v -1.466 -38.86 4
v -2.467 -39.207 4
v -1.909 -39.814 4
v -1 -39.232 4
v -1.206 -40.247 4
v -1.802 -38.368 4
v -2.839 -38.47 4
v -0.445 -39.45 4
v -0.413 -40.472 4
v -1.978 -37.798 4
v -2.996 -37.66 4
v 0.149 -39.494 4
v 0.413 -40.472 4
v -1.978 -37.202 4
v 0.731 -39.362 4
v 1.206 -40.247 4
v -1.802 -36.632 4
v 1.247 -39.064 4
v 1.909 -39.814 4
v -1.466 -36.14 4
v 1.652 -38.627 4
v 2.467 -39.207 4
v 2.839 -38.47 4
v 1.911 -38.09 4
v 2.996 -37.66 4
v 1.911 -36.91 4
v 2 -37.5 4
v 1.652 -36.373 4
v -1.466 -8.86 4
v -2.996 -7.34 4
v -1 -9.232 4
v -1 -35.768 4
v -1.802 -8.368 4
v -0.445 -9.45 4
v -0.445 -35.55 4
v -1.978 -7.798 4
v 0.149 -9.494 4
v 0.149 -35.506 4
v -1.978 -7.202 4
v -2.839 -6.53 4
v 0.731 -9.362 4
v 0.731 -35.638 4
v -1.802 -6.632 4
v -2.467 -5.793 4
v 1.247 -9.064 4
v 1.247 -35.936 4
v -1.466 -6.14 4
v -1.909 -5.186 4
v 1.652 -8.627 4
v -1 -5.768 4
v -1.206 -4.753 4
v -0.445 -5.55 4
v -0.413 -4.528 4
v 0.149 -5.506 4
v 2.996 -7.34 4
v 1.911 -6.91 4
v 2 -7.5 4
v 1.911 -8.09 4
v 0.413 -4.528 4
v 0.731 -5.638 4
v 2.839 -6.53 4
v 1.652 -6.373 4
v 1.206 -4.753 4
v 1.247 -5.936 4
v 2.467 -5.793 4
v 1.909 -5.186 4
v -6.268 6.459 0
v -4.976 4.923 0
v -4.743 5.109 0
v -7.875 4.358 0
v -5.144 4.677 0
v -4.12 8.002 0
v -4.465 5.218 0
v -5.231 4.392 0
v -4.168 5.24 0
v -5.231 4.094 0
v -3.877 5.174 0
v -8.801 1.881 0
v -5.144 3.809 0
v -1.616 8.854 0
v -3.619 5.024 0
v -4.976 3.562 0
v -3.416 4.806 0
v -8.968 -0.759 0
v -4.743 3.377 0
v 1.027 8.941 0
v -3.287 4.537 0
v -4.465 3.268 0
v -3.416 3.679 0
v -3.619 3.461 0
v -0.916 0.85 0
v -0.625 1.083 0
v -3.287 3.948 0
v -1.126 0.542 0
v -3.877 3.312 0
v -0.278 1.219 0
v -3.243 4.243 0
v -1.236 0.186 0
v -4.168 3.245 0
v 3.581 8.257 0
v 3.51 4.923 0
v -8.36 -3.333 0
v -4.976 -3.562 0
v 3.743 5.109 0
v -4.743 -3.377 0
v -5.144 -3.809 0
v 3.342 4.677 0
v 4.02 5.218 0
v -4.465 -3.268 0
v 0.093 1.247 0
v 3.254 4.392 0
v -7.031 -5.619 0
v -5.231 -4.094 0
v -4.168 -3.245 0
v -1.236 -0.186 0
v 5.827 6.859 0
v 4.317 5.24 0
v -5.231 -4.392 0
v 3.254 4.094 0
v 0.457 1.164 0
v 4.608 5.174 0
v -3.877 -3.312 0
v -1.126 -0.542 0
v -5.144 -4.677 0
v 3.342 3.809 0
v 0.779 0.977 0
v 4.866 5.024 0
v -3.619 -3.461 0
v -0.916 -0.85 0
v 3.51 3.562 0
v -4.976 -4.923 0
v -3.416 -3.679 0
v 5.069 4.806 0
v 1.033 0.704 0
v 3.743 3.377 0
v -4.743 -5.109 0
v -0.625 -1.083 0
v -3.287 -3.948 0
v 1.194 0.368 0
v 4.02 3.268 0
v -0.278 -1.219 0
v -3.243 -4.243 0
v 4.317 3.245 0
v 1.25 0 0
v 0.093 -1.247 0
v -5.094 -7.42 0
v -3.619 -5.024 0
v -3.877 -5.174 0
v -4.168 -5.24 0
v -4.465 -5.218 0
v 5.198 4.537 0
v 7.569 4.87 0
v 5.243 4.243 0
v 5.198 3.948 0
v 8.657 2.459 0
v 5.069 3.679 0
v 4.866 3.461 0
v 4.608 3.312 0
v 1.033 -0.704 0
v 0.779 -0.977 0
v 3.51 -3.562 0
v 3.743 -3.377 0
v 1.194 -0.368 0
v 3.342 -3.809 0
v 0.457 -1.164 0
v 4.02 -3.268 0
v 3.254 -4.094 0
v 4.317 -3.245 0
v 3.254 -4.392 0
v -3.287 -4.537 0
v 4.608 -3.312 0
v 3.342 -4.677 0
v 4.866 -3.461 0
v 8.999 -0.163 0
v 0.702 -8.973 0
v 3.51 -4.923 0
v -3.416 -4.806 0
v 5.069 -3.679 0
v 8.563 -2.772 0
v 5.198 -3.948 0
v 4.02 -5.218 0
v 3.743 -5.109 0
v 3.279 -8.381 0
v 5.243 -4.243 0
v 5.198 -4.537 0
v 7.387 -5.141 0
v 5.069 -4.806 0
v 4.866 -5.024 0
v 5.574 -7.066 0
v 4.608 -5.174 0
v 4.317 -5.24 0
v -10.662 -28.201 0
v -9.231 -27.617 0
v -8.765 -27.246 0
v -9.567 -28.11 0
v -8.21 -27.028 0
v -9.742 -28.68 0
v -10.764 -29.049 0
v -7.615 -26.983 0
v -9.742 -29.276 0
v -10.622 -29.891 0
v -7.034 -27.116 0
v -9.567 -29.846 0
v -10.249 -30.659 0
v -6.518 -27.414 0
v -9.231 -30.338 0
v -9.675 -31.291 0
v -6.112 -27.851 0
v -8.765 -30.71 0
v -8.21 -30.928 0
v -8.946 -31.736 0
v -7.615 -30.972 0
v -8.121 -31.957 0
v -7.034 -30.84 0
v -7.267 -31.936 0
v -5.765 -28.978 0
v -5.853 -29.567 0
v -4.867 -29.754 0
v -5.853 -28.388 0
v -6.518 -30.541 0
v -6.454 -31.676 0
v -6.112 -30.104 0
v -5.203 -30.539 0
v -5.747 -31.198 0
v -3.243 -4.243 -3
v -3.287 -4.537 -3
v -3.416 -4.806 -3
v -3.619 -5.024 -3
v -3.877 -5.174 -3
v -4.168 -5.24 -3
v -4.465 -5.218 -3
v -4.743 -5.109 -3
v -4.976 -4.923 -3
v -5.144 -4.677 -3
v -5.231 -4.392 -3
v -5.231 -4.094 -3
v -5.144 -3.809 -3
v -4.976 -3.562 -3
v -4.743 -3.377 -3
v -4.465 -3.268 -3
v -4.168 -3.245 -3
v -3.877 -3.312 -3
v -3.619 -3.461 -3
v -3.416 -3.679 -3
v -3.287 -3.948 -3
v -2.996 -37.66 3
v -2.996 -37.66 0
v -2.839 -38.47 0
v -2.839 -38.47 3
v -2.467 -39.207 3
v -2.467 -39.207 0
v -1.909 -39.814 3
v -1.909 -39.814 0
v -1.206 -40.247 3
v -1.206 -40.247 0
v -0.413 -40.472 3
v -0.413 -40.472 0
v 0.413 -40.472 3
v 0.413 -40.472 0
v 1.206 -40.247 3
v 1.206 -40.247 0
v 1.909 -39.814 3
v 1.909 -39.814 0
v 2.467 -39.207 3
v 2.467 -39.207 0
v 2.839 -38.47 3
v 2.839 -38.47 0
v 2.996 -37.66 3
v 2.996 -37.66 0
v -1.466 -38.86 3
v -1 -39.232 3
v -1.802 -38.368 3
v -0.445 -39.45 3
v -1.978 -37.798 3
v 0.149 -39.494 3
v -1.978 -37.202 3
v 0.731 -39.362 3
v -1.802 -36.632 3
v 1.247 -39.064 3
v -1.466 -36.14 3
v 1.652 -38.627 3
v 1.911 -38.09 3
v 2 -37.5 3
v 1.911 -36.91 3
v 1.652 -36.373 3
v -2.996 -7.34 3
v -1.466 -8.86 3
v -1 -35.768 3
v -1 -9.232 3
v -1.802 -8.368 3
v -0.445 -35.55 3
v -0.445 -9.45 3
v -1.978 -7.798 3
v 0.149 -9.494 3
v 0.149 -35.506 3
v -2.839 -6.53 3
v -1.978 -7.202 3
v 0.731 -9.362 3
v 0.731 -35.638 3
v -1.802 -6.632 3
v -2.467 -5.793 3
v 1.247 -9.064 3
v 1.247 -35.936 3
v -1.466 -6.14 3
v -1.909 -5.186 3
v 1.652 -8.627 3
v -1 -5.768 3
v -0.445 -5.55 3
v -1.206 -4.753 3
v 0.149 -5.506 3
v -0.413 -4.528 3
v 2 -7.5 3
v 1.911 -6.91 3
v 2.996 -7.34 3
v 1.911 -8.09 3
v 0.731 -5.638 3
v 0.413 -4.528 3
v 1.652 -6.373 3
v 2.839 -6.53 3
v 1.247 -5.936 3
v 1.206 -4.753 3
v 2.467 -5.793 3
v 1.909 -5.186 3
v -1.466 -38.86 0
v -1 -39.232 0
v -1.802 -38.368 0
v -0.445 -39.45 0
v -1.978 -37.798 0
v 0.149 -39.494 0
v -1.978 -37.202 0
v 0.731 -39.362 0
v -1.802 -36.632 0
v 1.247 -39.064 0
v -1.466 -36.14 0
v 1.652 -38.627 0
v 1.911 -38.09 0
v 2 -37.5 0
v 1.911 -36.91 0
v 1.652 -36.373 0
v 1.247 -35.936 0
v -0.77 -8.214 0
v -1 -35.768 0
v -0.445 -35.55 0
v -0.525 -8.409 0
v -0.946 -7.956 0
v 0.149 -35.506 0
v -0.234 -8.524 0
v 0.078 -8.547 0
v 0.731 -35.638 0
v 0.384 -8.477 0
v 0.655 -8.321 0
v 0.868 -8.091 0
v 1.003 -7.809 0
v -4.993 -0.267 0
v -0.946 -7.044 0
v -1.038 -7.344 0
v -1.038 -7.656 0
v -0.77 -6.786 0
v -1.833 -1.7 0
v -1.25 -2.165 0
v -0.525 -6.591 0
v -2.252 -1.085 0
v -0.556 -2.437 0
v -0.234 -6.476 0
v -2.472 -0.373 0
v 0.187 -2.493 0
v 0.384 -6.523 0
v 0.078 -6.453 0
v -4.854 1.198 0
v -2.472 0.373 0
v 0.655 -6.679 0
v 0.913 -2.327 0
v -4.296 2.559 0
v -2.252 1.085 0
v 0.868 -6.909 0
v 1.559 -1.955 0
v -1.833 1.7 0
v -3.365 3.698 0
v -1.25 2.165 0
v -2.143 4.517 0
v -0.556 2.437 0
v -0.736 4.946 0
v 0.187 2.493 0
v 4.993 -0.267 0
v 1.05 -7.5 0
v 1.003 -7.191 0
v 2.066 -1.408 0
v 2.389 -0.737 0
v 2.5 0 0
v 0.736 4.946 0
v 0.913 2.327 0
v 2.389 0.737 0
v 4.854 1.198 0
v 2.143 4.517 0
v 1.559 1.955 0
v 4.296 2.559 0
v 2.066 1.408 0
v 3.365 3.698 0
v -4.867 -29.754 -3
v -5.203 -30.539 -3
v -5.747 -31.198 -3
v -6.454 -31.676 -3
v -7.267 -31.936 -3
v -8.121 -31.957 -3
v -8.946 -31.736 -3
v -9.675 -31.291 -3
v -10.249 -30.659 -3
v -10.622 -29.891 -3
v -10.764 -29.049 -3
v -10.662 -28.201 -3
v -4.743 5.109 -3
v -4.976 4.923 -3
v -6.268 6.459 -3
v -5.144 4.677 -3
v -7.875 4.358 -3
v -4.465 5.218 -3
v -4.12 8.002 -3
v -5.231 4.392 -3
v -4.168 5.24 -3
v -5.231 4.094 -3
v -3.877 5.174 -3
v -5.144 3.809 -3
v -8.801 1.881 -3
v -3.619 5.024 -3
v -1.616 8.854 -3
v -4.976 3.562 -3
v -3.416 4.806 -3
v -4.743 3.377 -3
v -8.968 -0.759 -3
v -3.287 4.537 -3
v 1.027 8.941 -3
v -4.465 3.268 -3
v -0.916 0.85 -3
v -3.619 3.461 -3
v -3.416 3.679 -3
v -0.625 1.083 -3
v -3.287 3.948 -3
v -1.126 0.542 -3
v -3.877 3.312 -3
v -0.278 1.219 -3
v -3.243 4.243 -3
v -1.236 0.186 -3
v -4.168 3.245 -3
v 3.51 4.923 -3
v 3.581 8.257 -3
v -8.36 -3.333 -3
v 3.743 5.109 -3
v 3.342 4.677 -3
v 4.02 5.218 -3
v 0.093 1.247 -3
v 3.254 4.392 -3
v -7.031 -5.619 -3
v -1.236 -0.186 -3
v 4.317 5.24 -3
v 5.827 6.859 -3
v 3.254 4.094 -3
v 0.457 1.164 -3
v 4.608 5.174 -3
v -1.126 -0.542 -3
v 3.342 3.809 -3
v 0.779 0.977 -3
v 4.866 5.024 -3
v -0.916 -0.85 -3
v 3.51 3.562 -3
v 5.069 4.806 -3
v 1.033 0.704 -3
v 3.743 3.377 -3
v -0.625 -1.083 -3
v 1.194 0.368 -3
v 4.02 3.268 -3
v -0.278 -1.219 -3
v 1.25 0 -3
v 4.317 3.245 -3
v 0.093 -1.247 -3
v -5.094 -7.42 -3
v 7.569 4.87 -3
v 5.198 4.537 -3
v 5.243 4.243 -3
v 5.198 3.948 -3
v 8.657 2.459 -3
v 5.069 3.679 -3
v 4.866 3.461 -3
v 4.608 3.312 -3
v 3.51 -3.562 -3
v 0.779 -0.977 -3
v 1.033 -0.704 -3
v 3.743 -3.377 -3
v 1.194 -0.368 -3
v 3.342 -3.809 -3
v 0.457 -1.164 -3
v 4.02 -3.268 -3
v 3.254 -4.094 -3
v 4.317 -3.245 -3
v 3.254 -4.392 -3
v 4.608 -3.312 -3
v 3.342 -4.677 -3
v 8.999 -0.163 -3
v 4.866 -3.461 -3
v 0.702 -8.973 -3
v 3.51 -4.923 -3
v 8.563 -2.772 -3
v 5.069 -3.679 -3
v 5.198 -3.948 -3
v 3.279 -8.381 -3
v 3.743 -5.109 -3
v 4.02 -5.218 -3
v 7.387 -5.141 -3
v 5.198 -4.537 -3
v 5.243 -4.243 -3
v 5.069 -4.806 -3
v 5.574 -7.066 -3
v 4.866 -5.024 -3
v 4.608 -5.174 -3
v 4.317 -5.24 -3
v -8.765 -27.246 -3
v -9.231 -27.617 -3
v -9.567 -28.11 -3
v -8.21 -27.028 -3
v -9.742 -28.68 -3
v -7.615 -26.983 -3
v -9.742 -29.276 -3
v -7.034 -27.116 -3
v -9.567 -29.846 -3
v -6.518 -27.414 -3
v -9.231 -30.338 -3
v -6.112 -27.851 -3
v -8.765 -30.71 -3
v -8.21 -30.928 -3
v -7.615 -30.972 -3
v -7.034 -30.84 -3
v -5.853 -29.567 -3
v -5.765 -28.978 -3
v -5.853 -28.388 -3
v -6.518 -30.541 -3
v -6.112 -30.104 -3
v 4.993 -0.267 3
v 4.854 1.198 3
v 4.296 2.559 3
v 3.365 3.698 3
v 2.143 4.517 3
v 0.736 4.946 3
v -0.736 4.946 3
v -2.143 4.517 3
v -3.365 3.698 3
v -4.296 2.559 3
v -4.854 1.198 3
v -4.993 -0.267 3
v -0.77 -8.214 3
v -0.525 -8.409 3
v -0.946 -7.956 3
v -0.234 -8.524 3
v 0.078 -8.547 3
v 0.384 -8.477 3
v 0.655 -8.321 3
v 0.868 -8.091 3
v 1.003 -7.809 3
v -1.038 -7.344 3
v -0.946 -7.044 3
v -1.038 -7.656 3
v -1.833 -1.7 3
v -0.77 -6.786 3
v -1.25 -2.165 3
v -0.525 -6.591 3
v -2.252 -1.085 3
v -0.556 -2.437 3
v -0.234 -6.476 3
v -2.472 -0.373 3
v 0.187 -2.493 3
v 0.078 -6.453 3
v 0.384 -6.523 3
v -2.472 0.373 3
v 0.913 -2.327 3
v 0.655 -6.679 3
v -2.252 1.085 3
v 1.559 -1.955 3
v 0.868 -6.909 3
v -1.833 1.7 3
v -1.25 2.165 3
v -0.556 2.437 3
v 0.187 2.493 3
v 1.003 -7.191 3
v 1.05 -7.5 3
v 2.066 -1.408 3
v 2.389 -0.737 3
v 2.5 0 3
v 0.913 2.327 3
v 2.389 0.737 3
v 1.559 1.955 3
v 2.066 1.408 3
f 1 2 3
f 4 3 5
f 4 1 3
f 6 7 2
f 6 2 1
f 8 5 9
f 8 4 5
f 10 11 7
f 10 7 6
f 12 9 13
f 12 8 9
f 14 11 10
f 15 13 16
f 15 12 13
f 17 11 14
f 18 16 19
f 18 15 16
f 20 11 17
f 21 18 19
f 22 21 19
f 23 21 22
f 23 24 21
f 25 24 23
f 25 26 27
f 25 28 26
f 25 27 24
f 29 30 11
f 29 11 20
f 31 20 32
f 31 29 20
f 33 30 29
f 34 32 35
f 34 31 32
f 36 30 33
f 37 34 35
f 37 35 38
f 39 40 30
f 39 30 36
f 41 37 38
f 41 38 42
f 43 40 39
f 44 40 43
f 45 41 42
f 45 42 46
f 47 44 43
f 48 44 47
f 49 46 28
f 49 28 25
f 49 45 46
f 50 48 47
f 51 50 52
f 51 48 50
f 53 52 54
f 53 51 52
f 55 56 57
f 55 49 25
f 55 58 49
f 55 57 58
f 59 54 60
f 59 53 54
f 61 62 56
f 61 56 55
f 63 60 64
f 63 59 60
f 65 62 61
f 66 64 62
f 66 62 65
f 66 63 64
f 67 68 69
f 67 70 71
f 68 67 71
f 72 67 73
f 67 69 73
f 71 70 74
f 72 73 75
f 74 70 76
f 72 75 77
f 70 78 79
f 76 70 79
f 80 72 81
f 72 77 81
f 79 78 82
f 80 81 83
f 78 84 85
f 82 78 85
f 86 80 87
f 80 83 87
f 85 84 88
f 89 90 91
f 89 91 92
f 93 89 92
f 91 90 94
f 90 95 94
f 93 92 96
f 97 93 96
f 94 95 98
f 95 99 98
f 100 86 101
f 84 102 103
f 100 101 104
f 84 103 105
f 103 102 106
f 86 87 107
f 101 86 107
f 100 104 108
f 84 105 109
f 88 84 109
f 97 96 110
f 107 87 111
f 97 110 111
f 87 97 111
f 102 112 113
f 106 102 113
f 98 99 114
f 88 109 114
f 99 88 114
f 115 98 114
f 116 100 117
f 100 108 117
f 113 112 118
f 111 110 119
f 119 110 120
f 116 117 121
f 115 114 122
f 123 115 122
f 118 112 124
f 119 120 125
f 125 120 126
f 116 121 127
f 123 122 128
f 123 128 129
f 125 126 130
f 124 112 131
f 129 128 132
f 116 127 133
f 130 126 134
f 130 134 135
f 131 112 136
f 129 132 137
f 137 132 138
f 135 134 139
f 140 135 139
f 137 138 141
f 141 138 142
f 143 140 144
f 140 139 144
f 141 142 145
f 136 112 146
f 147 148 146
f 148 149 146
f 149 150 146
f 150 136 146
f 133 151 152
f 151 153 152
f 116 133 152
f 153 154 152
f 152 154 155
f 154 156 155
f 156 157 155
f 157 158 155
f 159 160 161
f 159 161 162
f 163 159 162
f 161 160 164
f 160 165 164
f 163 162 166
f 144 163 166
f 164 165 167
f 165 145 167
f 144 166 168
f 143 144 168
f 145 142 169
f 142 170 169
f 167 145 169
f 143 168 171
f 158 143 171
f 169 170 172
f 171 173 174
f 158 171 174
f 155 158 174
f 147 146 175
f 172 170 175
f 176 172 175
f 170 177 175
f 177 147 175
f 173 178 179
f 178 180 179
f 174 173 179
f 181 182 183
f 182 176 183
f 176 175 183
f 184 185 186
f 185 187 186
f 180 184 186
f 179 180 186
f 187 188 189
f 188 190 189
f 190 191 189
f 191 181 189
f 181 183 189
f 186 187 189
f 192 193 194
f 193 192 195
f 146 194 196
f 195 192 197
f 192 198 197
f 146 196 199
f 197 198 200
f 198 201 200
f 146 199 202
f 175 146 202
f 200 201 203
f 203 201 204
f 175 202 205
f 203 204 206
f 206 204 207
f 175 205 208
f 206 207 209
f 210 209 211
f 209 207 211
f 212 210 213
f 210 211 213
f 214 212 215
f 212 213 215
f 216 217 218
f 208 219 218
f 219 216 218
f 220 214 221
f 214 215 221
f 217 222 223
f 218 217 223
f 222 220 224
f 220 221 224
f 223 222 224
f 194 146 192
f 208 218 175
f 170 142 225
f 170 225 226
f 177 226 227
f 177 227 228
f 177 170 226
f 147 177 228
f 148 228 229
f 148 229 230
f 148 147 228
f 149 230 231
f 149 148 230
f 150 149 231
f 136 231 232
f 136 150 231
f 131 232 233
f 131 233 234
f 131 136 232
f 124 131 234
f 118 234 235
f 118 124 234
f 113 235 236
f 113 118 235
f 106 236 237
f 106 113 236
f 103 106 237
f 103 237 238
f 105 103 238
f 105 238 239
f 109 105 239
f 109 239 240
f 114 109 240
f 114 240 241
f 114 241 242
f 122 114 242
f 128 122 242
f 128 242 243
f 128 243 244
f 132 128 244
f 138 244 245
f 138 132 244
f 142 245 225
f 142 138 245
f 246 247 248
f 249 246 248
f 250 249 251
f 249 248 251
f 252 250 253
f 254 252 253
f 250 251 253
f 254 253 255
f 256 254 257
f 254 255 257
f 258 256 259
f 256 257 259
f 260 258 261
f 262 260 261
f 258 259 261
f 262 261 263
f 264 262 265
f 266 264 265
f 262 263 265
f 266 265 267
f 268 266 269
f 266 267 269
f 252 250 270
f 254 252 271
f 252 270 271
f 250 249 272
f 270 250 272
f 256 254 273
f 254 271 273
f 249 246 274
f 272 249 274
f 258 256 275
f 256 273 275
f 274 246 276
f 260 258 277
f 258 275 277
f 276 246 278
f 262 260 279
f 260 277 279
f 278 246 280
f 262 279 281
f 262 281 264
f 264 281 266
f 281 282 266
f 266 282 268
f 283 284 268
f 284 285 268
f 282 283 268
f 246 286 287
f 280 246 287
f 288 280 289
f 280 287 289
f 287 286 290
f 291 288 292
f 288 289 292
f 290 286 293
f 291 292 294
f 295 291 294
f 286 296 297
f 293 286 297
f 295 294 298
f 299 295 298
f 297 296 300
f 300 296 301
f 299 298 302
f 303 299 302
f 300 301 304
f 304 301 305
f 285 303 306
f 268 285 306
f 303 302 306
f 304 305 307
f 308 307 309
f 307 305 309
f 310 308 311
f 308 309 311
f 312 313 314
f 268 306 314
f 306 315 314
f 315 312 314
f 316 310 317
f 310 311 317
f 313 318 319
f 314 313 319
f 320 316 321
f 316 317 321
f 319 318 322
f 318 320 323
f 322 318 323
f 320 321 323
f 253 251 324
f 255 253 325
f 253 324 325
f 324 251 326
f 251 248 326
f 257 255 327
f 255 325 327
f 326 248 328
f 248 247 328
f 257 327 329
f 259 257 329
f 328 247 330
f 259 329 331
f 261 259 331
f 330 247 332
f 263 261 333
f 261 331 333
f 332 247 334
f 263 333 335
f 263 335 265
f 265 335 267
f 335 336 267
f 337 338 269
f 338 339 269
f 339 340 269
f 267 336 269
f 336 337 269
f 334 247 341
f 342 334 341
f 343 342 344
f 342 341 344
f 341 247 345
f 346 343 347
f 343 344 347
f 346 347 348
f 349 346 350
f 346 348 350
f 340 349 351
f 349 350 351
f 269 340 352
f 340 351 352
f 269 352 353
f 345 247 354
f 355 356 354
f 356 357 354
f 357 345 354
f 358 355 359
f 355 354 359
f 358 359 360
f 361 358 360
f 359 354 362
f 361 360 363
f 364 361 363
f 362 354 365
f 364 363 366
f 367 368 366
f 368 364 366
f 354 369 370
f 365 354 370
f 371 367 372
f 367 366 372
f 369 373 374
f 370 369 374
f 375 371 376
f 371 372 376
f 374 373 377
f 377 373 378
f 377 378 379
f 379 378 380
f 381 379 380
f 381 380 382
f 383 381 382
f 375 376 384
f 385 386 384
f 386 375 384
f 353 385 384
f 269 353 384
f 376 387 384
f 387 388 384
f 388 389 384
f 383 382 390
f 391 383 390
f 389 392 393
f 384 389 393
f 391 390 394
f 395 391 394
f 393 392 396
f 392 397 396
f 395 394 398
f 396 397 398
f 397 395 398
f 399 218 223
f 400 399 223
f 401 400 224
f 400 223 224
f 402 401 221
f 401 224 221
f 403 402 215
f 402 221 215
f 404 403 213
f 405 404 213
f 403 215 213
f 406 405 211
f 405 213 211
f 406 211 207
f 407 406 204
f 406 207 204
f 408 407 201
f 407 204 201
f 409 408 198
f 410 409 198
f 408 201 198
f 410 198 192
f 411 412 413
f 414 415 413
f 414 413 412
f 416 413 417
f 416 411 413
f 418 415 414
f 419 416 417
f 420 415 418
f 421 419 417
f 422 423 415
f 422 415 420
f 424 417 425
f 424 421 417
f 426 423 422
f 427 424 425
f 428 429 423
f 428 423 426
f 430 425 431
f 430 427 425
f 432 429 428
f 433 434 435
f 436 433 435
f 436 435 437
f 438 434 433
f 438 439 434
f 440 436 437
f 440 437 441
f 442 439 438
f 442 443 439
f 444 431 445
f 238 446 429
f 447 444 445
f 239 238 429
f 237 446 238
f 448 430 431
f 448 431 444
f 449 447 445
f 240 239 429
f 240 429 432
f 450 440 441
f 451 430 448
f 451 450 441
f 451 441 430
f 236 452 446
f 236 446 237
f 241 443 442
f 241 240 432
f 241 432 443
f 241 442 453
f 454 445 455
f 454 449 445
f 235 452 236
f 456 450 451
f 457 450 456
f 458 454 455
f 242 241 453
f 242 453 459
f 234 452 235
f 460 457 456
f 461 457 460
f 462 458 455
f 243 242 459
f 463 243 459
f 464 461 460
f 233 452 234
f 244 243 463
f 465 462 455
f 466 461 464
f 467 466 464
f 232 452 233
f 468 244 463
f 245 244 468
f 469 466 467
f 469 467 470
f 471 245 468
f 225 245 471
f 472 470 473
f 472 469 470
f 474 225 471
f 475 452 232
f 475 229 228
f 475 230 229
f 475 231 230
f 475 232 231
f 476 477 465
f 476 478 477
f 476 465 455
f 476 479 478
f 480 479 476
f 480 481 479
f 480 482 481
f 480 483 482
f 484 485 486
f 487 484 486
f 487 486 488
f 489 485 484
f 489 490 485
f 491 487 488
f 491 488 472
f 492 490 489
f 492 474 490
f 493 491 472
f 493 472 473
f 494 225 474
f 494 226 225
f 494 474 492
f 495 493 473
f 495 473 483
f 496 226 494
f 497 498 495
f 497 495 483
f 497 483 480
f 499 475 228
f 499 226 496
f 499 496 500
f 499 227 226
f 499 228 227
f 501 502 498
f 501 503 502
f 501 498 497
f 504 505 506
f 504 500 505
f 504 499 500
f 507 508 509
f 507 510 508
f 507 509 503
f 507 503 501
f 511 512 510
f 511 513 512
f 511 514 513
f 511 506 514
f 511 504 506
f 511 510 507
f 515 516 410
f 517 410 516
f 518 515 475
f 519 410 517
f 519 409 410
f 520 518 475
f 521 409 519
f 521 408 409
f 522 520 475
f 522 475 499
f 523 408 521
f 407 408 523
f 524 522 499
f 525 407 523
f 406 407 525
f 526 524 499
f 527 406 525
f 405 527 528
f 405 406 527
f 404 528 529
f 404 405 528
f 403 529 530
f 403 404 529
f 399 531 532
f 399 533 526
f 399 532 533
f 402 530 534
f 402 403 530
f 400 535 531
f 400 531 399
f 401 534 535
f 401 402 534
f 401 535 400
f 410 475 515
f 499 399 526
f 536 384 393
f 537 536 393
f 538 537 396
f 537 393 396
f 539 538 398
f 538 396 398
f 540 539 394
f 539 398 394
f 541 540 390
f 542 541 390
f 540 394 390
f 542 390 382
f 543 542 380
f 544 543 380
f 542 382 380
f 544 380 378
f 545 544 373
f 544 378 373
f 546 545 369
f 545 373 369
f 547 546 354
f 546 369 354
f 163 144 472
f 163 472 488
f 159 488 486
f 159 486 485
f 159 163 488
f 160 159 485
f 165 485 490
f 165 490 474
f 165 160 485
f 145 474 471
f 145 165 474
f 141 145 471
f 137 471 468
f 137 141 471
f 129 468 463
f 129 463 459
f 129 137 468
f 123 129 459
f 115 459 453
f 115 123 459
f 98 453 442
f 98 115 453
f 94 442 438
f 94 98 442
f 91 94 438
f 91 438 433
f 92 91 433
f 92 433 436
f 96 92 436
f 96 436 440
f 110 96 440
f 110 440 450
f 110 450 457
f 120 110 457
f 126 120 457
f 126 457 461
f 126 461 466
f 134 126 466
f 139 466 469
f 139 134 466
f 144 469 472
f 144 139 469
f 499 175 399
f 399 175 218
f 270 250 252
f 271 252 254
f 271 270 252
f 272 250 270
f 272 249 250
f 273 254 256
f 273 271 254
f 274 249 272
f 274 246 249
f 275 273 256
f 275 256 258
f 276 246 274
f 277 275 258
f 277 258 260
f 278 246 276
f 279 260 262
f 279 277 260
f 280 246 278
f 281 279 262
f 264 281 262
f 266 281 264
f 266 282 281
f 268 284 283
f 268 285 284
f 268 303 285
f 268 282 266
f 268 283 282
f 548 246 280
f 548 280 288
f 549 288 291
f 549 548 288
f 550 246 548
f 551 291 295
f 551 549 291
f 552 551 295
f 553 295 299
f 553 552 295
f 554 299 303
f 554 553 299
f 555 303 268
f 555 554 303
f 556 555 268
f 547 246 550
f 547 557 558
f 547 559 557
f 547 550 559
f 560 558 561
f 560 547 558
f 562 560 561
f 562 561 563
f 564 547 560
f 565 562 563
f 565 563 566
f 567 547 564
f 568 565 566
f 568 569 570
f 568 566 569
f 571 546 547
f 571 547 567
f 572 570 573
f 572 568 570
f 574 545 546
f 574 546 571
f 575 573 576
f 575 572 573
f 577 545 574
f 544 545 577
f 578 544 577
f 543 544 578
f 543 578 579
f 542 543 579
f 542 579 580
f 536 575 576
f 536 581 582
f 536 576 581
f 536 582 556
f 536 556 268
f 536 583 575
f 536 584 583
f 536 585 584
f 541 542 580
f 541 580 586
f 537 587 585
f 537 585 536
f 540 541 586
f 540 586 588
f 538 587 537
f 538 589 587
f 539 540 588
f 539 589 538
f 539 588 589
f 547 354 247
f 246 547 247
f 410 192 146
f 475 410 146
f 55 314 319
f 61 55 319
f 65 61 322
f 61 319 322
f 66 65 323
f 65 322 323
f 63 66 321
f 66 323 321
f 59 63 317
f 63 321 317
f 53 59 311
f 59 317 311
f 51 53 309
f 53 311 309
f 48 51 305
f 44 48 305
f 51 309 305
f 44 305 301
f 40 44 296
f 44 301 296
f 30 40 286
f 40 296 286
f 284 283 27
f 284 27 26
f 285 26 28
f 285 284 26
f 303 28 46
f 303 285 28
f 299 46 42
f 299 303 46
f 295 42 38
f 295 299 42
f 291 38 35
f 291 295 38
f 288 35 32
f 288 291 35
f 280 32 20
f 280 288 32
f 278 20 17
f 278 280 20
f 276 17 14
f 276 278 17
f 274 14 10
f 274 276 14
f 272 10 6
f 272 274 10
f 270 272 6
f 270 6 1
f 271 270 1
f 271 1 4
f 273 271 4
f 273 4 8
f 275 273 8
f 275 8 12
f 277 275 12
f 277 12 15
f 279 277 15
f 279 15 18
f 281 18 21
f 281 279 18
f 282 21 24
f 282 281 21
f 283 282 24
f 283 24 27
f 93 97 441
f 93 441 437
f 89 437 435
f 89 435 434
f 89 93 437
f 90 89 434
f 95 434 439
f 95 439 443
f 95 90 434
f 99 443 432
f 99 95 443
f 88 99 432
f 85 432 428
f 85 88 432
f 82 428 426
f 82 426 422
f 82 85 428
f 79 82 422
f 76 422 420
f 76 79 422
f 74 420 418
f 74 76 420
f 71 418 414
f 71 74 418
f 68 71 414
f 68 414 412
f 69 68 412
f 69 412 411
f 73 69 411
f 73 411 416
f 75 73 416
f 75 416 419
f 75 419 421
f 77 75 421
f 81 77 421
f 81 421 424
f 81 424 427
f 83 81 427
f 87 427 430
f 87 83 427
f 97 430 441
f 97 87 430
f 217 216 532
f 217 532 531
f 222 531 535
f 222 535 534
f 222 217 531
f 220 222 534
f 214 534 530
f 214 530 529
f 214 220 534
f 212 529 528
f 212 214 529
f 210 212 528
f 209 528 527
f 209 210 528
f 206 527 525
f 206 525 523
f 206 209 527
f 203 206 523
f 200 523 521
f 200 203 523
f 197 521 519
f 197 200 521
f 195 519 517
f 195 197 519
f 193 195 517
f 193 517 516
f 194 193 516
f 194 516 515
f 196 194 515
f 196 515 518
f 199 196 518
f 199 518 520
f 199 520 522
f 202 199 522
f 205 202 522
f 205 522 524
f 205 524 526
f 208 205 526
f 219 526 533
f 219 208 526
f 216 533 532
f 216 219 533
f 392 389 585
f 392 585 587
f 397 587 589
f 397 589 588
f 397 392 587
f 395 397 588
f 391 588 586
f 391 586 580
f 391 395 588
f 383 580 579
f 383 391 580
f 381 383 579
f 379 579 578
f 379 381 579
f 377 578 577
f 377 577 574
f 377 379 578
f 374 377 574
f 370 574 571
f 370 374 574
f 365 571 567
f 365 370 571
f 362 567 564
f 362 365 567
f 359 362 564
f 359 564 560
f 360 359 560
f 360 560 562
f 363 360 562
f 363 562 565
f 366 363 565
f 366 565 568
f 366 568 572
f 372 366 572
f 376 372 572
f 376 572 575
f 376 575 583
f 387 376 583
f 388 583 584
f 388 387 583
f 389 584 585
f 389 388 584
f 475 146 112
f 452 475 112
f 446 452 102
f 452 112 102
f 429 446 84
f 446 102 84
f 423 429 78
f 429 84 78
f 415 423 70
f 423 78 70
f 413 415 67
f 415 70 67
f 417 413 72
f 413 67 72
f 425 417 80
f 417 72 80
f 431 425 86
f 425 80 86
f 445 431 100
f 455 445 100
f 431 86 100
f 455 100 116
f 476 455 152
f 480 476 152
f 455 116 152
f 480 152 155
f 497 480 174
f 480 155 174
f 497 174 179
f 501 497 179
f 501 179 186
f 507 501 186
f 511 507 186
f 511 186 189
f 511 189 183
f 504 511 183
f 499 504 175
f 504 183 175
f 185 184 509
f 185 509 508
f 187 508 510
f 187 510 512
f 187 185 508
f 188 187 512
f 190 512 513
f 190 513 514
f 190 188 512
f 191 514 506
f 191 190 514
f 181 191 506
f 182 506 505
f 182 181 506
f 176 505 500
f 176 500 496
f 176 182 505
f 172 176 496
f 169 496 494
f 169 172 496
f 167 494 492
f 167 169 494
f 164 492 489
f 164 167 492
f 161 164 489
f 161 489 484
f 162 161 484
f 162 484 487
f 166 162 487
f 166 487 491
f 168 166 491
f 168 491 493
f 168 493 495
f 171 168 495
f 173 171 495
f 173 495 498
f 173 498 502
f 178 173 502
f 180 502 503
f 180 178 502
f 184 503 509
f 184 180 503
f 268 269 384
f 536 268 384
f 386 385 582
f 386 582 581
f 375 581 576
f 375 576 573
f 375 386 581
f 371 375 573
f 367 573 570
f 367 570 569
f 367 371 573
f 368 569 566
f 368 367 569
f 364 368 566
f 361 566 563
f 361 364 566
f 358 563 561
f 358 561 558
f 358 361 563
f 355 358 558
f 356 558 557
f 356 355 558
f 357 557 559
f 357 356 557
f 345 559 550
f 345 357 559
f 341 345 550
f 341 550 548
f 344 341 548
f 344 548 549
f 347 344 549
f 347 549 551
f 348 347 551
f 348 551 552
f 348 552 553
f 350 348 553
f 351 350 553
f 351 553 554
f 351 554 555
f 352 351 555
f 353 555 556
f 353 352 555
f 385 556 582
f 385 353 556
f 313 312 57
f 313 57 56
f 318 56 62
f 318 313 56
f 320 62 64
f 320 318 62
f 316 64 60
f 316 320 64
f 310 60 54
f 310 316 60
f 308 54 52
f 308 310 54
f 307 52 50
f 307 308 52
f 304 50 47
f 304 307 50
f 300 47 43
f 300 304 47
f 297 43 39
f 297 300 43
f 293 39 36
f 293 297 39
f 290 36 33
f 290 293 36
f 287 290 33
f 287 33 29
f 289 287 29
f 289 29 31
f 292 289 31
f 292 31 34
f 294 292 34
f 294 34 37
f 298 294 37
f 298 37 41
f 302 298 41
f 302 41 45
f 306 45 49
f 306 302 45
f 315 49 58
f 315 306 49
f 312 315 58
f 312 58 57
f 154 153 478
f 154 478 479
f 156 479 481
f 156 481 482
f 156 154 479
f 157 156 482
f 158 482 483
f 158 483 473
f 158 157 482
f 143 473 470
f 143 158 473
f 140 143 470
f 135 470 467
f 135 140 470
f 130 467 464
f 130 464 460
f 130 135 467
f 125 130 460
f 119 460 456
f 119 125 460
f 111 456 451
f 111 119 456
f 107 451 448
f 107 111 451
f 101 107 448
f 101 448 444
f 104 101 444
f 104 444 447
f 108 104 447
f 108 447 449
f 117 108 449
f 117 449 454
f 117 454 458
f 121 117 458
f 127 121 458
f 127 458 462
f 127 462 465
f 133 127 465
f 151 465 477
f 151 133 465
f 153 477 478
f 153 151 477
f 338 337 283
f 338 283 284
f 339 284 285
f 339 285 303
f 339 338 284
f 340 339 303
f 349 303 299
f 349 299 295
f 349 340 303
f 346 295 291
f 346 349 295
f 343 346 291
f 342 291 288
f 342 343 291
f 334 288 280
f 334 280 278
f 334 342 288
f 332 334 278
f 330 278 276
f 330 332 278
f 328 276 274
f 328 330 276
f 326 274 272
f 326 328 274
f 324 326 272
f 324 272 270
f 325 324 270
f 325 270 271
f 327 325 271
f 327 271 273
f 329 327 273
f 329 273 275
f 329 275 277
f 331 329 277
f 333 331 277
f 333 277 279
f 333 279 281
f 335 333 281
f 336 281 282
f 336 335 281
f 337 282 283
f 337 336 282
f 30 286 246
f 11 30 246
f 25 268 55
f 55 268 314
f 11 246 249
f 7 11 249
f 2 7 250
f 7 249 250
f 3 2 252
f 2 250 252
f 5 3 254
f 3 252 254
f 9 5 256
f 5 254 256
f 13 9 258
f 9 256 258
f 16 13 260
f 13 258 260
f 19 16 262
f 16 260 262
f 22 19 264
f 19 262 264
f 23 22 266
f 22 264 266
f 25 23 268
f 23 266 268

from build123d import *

# Parameters (mm, degrees)
F0_R     = 2
F0_R_2   = 1.05
F0_R_3   = 2.5
F1_DEPTH = 3
F2_R     = 2
F3_DEPTH = 1
F4_R     = 1
F4_R_2   = 1.25
F4_R_3   = 2
F5_DEPTH = 3


with BuildPart() as f1:
    # F0 (on Top) → F1 (new body)
    with BuildSketch(Plane.XY):
        with BuildLine():
            Line((2.99573, -37.66), (4.992884, -0.266667))
            ThreePointArc((4.992884, -0.266667), (0, 5), (-4.992884, -0.266667))
            Line((-4.992884, -0.266667), (-2.99573, -37.66))
            ThreePointArc((-2.99573, -37.66), (0, -40.5), (2.99573, -37.66))
        make_face()
        with Locations((0, -37.5)):
            Circle(F0_R, mode=Mode.SUBTRACT)
        with Locations((0, -7.5)):
            Circle(F0_R_2, mode=Mode.SUBTRACT)
        Circle(F0_R_3, mode=Mode.SUBTRACT)
    extrude(amount=F1_DEPTH)


with BuildPart() as f3:
    # F2 (on face) → F3 (new body)
    with BuildSketch(Plane.XY.offset(3)):
        with BuildLine():
            Line((-2.99573, -7.34), (-2.99573, -37.66))
            ThreePointArc((-2.99573, -37.66), (0, -40.5), (2.99573, -37.66))
            Line((2.99573, -37.66), (2.99573, -7.34))
            ThreePointArc((2.99573, -7.34), (0, -4.5), (-2.99573, -7.34))
        make_face()
        with Locations((0, -37.5)):
            Circle(F2_R, mode=Mode.SUBTRACT)
        with Locations((0, -7.5)):
            Circle(F2_R, mode=Mode.SUBTRACT)
    extrude(amount=F3_DEPTH)


with BuildPart() as f5:
    # F4 (on face) → F5 (new body)
    with BuildSketch(Plane(origin=(0, 0, 0), x_dir=(1, 0, 0), z_dir=(0, 0, -1))):
        with BuildLine():
            Line((-10.662349, 28.201318), (-5.09393, 7.419695))
            ThreePointArc((-5.09393, 7.419695), (2.329371, -8.693332), (0.701625, 8.97261))
            Line((0.701625, 8.97261), (-4.866794, 29.754232))
            ThreePointArc((-4.866794, 29.754232), (-8.541028, 31.875552), (-10.662349, 28.201318))
        make_face()
        with Locations((-4.242641, -4.242641)):
            Circle(F4_R, mode=Mode.SUBTRACT)
        with Locations((-4.242641, 4.242641)):
            Circle(F4_R, mode=Mode.SUBTRACT)
        Circle(F4_R_2, mode=Mode.SUBTRACT)
        with Locations((4.242641, -4.242641)):
            Circle(F4_R, mode=Mode.SUBTRACT)
        with Locations((4.242641, 4.242641)):
            Circle(F4_R, mode=Mode.SUBTRACT)
        with Locations((-7.764571, 28.977775)):
            Circle(F4_R_3, mode=Mode.SUBTRACT)
    extrude(amount=F5_DEPTH)


solid = Compound([f1.part, f3.part, f5.part])
